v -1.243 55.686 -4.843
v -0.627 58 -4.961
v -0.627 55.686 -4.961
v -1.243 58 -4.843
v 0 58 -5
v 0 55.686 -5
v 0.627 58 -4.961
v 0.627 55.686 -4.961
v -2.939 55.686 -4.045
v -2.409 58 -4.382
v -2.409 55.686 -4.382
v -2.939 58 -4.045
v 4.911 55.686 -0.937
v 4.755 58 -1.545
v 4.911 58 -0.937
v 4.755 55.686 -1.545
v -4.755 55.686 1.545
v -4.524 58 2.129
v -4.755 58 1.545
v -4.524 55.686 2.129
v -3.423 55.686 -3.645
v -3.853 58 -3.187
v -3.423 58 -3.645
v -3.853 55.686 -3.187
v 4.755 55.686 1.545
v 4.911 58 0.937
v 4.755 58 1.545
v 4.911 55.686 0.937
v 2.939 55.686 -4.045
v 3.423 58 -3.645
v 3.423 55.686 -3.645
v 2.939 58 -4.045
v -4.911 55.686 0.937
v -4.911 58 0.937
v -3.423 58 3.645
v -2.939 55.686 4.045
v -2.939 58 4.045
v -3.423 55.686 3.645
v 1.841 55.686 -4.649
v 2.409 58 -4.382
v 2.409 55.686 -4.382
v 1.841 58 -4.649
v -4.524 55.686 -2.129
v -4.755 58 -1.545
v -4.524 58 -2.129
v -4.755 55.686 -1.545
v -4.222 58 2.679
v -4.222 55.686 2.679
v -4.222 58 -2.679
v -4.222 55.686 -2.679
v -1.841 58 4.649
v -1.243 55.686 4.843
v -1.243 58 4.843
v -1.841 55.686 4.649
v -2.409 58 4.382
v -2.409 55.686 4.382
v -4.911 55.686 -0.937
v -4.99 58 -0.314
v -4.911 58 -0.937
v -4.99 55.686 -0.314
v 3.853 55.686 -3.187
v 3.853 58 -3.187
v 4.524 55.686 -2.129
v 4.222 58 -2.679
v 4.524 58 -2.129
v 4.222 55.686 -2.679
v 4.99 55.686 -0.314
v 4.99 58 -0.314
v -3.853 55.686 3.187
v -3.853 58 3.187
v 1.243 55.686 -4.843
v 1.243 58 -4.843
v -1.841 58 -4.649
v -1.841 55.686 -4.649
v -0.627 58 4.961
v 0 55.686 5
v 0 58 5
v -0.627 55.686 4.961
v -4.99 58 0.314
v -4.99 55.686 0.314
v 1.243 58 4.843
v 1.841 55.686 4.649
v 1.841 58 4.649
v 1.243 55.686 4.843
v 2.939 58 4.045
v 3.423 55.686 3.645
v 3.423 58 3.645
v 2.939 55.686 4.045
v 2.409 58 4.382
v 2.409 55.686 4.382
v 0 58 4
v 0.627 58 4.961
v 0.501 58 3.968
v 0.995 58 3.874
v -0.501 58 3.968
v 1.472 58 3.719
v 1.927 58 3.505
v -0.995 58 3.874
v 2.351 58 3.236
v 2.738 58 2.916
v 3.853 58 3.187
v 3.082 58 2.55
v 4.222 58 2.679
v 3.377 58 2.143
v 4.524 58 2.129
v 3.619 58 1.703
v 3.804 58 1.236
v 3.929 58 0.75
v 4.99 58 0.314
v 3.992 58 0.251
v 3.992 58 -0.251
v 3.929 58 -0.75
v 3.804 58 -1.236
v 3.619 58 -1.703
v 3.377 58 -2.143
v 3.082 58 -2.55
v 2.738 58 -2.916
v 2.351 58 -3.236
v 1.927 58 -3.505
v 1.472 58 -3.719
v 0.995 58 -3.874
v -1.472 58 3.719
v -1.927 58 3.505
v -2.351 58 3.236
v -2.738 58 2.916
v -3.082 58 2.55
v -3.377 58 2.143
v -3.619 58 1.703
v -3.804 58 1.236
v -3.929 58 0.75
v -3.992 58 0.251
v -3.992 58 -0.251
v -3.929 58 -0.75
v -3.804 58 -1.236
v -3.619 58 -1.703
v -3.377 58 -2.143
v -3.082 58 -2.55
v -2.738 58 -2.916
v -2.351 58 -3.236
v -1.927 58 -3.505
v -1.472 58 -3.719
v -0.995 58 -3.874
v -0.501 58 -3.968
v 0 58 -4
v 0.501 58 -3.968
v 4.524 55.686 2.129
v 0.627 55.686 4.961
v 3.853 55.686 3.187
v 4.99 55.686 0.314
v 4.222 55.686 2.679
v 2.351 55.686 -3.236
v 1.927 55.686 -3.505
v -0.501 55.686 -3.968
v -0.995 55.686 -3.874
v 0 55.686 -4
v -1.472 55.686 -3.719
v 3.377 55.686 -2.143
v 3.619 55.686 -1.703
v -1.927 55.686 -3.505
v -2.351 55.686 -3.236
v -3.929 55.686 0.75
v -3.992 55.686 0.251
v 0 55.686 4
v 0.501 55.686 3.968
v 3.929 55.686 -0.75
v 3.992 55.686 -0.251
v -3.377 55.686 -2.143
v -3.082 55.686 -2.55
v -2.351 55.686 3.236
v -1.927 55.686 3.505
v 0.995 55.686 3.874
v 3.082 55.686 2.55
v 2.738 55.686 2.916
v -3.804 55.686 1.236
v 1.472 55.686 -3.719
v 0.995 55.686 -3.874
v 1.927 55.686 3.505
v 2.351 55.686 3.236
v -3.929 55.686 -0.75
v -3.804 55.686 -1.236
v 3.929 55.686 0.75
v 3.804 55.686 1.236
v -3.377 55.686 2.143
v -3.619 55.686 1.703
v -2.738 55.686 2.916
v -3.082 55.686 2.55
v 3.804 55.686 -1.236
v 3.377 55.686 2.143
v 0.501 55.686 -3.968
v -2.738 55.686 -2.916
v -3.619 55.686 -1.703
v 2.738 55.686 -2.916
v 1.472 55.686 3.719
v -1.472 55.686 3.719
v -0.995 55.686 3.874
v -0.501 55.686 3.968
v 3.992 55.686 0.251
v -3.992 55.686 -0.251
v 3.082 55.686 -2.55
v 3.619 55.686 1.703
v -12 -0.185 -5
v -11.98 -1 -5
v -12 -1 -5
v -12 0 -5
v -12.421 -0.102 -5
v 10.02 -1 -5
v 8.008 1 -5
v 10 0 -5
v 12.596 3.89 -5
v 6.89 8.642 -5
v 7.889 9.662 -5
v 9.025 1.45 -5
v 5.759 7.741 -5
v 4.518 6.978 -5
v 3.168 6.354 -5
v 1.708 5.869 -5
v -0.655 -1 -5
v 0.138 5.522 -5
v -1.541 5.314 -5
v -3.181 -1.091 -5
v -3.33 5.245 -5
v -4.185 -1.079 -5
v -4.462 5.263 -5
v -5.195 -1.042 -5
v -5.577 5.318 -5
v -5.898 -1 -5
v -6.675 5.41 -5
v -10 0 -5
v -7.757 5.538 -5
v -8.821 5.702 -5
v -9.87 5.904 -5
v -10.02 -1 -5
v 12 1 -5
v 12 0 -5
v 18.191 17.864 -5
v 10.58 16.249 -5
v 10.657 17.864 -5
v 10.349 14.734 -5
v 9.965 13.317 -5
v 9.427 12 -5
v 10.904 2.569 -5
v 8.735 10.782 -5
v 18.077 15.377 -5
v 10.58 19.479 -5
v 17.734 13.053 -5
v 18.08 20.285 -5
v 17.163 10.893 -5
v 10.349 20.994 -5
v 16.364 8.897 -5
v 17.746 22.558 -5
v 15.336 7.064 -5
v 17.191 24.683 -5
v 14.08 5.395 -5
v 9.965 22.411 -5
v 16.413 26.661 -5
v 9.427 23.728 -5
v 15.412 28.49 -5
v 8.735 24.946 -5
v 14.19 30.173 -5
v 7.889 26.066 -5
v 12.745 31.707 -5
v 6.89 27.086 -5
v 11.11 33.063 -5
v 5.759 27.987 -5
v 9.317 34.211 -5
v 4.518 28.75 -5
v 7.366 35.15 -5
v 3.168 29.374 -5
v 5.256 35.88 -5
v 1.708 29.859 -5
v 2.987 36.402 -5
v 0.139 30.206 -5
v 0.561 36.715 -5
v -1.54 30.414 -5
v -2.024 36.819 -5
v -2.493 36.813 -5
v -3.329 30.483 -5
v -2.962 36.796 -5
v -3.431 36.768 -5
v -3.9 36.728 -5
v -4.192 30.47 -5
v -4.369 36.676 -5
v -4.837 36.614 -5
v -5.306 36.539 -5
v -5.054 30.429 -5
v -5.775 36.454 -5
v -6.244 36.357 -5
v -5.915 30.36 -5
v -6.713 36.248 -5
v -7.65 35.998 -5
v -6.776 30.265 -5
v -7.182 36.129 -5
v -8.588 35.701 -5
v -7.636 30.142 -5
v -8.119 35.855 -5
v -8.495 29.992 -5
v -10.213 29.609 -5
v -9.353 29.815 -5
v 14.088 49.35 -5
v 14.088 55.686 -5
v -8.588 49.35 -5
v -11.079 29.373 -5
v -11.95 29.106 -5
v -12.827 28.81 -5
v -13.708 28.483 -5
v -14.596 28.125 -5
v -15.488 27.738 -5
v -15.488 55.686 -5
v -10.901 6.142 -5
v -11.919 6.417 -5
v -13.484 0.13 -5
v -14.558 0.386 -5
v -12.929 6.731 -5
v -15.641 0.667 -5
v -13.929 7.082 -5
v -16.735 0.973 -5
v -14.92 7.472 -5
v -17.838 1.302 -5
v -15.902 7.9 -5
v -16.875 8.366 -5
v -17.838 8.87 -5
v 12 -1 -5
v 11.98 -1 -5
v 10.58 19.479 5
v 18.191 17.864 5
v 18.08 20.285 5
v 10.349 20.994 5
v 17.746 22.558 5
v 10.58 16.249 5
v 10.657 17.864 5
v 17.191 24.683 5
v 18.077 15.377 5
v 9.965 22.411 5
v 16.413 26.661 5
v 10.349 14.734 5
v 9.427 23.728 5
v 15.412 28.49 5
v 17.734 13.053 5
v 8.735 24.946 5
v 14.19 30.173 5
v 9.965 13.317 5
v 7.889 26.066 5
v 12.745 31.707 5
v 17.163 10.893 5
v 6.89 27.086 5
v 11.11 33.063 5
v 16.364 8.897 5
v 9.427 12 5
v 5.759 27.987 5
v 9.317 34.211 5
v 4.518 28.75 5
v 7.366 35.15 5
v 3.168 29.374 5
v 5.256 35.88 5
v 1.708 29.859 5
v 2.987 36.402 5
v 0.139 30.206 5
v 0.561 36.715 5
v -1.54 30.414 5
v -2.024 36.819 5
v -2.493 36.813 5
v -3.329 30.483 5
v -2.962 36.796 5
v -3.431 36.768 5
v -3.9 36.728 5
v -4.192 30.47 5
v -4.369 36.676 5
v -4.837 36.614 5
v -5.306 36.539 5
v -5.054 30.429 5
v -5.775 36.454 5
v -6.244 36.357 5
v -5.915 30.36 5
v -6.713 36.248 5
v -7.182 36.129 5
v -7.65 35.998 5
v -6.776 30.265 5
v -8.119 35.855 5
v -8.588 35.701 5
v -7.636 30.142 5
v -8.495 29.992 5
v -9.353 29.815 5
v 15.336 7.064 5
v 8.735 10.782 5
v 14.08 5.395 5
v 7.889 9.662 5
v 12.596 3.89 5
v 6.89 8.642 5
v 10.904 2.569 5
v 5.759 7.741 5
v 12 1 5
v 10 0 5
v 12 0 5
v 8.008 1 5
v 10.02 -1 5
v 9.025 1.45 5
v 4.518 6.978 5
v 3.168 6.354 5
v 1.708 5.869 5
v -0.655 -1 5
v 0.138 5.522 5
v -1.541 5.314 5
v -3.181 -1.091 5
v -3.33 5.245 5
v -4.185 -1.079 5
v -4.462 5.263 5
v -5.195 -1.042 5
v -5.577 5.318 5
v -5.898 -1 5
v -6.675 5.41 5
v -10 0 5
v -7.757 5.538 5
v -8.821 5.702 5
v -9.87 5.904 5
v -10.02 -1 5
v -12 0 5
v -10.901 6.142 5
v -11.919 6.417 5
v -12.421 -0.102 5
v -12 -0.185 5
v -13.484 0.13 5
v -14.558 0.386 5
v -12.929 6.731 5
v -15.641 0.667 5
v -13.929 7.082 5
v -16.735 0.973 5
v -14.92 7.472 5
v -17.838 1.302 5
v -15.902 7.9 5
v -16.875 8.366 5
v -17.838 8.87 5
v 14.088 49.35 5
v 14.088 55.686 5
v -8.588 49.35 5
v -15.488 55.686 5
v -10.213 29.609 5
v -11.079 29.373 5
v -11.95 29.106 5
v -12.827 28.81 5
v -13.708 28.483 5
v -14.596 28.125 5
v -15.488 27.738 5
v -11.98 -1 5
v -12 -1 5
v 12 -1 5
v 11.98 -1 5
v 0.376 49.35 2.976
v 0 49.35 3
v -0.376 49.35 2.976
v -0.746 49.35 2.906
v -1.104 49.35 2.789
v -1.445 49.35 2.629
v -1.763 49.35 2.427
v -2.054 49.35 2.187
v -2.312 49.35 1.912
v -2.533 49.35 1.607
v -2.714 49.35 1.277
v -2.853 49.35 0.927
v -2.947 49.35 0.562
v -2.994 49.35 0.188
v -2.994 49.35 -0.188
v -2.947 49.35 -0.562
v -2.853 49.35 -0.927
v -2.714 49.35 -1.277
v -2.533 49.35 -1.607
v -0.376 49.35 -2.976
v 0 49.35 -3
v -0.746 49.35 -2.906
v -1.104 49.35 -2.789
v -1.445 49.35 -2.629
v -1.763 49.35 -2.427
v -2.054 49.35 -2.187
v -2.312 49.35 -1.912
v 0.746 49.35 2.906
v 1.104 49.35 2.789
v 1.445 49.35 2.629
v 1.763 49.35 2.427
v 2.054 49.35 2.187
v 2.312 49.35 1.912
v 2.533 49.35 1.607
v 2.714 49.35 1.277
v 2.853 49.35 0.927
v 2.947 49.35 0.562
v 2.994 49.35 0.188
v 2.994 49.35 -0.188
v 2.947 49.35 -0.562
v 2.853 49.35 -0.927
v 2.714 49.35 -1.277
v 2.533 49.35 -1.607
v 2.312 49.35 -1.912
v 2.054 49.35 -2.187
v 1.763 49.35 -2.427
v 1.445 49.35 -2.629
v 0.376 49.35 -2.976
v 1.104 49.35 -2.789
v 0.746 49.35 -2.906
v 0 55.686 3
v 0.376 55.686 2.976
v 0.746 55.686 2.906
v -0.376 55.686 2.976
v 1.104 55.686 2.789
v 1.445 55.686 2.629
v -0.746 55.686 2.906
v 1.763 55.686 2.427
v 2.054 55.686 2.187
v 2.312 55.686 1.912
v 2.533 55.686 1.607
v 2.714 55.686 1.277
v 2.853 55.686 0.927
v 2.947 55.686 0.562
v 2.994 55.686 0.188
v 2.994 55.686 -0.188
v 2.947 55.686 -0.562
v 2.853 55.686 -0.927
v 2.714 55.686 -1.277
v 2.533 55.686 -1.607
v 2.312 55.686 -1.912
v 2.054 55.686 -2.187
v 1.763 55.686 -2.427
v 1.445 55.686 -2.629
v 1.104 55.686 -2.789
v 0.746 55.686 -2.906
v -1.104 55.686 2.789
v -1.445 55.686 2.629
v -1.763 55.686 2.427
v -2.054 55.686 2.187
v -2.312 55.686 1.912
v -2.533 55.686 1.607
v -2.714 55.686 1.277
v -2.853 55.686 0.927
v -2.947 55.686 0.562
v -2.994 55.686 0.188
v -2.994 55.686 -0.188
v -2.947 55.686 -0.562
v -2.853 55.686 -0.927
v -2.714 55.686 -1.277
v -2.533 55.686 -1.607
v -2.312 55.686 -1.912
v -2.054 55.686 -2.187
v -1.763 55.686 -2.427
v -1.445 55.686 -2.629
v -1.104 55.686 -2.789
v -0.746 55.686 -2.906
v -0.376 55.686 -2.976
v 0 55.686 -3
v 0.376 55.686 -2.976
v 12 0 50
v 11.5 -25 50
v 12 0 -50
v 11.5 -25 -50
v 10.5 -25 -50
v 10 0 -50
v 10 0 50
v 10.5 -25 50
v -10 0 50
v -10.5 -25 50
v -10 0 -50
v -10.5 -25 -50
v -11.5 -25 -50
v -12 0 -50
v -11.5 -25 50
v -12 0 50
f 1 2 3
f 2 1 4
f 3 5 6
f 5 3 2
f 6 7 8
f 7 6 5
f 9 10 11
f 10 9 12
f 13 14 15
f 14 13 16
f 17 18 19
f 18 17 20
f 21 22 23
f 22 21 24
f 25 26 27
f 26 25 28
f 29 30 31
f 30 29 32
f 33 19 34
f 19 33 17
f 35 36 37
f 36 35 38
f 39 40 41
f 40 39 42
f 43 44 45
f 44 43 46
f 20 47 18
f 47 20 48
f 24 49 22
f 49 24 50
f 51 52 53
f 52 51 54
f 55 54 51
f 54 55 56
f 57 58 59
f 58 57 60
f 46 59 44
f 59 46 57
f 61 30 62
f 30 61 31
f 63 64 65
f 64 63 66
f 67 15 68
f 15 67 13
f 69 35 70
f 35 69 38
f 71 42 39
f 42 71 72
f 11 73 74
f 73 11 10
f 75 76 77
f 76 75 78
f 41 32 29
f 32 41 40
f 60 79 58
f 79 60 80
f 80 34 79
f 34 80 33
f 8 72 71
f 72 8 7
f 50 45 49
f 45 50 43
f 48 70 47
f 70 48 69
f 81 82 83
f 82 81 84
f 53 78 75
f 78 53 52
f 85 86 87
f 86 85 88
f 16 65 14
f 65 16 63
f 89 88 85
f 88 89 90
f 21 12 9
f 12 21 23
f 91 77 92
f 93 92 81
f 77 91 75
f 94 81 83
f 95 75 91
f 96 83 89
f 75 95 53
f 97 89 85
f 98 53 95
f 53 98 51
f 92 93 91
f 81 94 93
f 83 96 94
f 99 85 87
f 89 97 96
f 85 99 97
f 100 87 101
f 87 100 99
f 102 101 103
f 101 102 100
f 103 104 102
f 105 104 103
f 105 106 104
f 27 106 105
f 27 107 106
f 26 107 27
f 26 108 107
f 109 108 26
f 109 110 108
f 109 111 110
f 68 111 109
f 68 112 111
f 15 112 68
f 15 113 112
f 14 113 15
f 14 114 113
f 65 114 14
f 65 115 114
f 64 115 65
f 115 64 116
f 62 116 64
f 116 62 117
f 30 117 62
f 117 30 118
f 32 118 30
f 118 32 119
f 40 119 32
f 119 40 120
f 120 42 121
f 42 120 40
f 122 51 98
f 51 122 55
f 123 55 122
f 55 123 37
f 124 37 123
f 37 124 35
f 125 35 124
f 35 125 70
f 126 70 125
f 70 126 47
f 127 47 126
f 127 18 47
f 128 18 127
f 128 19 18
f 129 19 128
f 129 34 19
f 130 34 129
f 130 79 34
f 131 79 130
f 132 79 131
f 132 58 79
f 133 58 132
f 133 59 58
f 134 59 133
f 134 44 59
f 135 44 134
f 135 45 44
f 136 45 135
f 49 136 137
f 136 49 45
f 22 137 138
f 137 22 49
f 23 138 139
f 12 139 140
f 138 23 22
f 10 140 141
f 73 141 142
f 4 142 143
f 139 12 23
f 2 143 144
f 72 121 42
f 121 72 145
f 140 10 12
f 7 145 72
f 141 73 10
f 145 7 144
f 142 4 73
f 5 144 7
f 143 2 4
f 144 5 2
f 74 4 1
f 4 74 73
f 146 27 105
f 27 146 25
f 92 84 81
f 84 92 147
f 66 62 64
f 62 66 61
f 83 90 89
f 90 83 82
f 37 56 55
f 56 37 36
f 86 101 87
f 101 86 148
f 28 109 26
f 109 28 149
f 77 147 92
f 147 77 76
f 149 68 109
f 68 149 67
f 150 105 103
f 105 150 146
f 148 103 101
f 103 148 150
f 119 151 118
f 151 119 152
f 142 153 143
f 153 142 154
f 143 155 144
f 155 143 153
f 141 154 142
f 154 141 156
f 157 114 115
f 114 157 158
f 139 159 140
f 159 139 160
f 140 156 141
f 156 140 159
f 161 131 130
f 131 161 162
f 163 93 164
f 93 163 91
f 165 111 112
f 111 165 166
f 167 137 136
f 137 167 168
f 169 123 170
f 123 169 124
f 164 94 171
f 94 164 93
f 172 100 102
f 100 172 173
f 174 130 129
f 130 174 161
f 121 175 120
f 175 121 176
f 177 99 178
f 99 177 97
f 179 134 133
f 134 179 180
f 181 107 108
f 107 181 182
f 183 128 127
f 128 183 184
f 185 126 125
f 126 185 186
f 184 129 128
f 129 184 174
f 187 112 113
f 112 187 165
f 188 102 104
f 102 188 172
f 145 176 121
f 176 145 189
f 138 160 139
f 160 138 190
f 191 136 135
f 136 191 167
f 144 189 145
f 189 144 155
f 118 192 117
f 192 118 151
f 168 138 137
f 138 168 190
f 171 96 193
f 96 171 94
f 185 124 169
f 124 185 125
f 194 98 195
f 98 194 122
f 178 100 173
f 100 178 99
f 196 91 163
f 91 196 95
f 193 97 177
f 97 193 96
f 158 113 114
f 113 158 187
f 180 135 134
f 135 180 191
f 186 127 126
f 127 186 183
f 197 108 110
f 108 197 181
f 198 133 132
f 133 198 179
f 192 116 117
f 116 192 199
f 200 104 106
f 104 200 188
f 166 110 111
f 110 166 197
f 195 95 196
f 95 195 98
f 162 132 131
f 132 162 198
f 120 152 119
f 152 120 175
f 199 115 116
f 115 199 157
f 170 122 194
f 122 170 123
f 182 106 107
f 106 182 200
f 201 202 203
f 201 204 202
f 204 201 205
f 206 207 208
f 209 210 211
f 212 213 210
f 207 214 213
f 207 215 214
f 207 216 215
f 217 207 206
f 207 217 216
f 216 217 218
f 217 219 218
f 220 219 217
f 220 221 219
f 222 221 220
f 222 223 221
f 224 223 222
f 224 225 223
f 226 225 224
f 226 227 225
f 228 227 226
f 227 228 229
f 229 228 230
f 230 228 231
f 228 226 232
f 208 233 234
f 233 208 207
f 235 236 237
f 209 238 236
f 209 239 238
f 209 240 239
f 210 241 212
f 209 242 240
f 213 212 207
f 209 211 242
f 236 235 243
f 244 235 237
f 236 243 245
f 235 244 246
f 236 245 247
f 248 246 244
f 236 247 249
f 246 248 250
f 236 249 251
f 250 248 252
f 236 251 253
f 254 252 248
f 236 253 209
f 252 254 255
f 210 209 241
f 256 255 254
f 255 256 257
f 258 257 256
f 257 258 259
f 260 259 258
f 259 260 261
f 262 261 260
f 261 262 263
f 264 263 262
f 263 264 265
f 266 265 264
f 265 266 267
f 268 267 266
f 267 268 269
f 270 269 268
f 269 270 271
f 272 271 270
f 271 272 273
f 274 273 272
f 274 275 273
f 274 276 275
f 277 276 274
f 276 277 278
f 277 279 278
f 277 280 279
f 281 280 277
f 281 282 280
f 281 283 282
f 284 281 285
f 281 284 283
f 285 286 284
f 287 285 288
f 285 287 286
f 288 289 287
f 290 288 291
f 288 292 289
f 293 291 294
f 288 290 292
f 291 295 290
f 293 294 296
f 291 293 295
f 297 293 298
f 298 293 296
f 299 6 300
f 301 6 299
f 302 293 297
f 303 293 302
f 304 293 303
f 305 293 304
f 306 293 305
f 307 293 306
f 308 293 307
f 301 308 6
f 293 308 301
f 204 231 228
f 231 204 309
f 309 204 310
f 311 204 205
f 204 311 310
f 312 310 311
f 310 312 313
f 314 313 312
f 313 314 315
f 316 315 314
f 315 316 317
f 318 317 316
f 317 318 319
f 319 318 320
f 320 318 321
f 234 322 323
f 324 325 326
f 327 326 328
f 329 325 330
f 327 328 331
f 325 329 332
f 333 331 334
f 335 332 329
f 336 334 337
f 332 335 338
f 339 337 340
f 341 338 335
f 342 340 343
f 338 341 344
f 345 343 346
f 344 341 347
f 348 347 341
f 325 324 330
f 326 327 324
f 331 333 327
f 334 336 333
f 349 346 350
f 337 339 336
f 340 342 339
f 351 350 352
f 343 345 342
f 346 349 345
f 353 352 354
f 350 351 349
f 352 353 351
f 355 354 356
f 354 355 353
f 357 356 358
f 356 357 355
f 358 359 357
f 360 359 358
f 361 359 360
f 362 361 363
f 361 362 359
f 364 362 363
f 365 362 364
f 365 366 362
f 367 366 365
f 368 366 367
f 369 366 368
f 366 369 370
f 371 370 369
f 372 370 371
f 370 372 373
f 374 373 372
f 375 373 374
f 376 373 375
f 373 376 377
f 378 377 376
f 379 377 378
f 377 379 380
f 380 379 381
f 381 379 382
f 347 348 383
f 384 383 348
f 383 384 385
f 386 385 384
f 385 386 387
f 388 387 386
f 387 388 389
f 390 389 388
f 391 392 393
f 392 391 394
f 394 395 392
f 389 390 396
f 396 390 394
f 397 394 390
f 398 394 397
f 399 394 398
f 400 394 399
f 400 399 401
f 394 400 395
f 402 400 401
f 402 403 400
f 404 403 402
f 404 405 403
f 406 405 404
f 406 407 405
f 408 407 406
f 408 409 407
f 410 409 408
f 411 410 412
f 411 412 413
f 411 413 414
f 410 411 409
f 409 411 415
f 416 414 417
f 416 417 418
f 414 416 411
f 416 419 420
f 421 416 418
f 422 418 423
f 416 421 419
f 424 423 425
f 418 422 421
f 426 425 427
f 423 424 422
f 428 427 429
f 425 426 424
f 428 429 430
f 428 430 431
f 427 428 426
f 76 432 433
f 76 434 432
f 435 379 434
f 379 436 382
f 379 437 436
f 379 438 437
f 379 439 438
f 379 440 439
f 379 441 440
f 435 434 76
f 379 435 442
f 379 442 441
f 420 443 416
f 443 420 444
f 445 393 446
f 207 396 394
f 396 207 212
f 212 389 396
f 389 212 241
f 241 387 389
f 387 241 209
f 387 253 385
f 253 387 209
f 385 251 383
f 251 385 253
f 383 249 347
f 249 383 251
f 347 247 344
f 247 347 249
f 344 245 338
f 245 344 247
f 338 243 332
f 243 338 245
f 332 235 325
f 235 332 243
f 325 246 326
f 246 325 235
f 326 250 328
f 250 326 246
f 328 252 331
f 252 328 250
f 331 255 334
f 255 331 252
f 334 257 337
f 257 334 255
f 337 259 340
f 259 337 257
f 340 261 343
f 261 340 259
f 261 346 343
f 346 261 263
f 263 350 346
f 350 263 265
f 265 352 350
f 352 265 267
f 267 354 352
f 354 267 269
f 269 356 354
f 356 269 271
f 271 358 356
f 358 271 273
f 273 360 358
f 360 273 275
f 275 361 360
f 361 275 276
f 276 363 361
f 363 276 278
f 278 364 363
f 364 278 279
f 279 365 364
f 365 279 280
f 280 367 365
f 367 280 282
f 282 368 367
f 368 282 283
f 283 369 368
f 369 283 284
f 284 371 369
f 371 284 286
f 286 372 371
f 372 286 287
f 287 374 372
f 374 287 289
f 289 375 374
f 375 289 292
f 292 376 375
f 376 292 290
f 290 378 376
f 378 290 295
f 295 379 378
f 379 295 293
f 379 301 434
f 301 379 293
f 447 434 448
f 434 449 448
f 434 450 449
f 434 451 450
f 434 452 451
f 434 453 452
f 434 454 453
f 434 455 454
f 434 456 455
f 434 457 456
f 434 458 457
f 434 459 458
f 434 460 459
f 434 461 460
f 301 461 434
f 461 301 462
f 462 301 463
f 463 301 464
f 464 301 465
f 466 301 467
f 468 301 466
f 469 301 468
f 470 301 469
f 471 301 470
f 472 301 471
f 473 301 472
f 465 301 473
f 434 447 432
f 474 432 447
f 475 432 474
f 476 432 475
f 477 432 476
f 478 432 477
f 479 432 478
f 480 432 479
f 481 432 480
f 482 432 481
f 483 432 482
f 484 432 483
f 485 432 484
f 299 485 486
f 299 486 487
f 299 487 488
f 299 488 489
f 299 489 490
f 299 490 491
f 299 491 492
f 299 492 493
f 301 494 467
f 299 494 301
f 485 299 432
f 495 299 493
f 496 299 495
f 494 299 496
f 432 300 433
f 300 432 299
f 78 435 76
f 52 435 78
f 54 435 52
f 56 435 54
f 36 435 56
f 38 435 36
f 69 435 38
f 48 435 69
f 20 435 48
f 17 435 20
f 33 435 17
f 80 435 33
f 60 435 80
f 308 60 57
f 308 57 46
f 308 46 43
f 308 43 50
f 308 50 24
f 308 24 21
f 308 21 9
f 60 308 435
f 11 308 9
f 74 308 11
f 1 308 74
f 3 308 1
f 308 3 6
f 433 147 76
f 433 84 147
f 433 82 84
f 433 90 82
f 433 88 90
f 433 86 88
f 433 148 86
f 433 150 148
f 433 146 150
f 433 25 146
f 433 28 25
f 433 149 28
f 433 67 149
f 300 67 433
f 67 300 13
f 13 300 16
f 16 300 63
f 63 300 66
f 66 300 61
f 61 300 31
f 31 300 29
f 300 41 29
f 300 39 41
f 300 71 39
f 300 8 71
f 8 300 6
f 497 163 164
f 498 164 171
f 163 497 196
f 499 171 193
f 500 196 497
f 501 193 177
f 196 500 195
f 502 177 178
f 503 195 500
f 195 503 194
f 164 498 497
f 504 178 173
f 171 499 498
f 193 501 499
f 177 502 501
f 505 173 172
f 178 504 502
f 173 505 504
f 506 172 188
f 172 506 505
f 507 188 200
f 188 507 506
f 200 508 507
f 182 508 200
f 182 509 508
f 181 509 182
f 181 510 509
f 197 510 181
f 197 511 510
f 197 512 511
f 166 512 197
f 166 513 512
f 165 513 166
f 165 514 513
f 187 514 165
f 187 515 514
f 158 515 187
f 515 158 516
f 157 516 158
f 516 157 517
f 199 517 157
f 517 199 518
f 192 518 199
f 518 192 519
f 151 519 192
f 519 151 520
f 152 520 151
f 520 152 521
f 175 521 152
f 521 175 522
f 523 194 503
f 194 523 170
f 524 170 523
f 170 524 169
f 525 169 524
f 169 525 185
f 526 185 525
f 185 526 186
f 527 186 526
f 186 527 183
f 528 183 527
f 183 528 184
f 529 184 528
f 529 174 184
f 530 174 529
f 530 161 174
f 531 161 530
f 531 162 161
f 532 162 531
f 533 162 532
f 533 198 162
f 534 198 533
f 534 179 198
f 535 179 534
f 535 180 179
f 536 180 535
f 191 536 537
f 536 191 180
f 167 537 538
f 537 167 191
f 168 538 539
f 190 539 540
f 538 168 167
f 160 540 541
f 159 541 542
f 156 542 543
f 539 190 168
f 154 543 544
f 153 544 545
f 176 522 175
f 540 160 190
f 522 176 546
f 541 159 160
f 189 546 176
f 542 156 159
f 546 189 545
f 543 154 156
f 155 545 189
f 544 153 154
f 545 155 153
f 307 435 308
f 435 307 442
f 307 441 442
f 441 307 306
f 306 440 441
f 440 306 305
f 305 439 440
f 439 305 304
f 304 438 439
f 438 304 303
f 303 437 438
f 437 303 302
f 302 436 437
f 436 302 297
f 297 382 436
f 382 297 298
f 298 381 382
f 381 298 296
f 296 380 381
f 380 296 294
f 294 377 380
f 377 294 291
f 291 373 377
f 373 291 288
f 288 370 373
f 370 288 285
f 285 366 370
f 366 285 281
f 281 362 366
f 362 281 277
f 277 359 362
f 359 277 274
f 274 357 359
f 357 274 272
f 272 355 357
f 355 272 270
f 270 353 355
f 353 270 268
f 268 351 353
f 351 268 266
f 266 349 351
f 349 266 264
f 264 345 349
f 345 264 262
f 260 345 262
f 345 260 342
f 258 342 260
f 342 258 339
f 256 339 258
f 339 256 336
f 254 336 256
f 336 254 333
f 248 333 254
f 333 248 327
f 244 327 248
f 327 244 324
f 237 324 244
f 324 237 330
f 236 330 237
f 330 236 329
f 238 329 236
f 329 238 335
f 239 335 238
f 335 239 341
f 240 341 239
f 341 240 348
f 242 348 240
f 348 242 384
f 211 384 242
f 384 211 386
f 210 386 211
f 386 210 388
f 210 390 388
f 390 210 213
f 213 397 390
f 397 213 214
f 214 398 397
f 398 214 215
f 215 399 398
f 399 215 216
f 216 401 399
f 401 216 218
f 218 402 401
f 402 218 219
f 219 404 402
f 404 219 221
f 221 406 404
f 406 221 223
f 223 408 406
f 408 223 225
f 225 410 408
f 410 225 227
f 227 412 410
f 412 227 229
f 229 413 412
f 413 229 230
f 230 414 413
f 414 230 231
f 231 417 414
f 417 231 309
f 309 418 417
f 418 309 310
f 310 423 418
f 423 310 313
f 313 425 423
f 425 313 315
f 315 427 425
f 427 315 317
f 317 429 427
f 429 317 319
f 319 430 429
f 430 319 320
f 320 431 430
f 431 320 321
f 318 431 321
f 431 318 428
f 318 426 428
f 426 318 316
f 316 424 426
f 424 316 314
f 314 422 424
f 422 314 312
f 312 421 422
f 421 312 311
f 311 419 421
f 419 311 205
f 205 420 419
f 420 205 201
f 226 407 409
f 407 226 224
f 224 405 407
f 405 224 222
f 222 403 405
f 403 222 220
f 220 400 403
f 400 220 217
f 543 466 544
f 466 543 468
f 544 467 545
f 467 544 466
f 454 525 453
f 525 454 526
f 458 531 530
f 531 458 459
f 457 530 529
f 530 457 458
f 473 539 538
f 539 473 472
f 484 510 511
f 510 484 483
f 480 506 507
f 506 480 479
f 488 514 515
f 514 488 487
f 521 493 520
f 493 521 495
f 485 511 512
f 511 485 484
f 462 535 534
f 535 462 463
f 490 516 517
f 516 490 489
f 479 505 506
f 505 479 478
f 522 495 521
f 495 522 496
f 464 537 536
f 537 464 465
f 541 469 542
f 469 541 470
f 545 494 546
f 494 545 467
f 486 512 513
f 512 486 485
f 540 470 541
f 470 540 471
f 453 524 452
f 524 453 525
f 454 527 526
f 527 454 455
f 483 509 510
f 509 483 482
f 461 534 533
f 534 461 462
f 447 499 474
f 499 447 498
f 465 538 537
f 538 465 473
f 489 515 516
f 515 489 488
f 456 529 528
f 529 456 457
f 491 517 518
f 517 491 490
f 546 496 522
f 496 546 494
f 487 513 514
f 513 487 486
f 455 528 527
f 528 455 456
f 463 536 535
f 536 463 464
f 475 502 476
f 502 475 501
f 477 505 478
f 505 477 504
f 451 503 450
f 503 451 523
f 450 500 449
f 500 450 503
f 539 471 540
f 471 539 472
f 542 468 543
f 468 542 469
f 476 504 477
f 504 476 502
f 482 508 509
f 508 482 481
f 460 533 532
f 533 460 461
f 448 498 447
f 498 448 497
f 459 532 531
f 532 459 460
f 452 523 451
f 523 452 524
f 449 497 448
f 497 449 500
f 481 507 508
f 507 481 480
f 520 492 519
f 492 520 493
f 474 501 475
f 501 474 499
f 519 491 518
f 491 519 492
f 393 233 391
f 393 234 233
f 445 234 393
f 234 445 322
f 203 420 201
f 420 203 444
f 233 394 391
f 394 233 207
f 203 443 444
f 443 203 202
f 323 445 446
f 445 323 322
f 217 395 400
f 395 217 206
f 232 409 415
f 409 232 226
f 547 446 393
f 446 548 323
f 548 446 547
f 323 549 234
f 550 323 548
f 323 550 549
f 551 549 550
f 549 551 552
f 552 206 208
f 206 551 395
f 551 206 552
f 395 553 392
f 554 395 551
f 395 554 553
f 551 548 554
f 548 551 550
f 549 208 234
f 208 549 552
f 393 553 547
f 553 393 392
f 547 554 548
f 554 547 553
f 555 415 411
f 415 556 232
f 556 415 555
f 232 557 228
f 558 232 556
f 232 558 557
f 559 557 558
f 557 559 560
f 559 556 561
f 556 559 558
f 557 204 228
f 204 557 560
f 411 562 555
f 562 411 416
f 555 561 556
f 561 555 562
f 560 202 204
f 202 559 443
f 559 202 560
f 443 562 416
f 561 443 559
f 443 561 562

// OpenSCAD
module num(t) {
    linear_extrude(height=10, center=true, convexity=3)
        text(t, size=55, font="arial black", halign="center");
}

module cakenum(t) {
union(){
    difference(){
        union() {
            num(t);
            translate([0,55,0])
                candlecatch();
        }
        
        translate([0,53,0])
            candlehole();
    }
    foot();

    
}
}

module foot() {
xd=1;
yd=25;
standsizex=24;
standsizez=10;
ydsupport=25;

union(){
    cube([standsizex,2,standsizez], center=true);
    //linear_extrude(h=10, center=true)
    //    polygon([[-xd,0], [xd, 0], [xd*0.5, -yd], [-xd*0.5,-yd]]);
    translate([standsizex/2-xd,0,0])
    linear_extrude(h=10, center=true)
        polygon([[-xd,0], [xd, 0], [xd*0.5, -ydsupport], [-xd*0.5,-ydsupport]]);
    translate([-standsizex/2+xd,0,0])
    linear_extrude(h=10, center=true)
        polygon([[-xd,0], [xd, 0], [xd*0.5, -ydsupport], [-xd*0.5,-ydsupport]]);
}    
}

module candlecatch() {
    height = 6;
    difference(){
        translate([0,0,0])
        rotate([0,90,90])
        cylinder(h=height, r=5 ,center=true);
        rotate([0,90,90])
        cylinder(h=height+1, r=4 ,center=true);
    }
}

module candlehole() {
    rotate([0,90,90])
    cylinder(h=10, r=3 ,center=true);
    
}
$fn=50;

module five() {
    cakenum("5");
}

module three() {
    cakenum("3");
}

five();
//three();
//import("3.stl");
